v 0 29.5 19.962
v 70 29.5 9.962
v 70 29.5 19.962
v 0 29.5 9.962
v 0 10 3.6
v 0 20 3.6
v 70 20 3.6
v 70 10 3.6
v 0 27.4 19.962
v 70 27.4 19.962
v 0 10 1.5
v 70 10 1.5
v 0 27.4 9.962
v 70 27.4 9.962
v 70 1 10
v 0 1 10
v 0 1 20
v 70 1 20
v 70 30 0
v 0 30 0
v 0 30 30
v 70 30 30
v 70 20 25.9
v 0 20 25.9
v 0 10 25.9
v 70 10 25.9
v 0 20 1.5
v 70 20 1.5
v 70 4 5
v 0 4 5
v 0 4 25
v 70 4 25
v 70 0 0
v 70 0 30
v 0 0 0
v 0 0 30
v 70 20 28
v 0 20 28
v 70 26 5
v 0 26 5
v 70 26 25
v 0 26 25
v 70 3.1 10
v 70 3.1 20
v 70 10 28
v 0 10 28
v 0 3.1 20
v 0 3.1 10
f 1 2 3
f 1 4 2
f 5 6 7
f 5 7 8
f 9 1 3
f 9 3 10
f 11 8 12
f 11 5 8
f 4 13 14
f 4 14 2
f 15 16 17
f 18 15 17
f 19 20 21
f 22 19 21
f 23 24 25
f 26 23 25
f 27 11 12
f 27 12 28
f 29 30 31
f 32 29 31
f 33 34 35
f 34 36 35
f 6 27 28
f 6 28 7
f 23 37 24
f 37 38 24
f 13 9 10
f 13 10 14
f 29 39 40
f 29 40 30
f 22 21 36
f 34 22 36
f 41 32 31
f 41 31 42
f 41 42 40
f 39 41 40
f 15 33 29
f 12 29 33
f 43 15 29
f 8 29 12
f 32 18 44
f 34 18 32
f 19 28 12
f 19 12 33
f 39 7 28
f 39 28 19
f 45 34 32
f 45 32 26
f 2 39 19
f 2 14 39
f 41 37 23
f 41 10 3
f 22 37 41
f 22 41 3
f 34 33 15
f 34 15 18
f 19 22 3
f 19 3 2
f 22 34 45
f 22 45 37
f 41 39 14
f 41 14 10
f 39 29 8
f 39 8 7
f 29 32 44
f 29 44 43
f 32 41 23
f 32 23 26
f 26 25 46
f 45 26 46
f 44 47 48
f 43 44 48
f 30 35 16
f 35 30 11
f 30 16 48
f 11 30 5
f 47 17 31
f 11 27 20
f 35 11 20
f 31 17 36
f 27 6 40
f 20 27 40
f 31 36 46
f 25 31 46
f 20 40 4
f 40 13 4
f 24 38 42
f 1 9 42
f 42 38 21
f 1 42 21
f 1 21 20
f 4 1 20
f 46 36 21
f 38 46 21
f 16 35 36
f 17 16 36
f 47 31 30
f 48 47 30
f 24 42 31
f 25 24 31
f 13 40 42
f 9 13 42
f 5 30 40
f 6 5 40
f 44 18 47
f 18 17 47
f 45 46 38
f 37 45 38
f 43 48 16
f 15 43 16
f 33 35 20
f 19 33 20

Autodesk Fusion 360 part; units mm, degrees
sketch "Sketch1" plane through (0, 0, 0) normal (1, 0, 0) x (0, 1, 0)
  line L0 (0, 0) -> (30, 0)
  line L1 (30, 0) -> (30, 30)
  line L2 (30, 30) -> (0, 30)
  line L3 (0, 30) -> (0, 0)
  line L4 (1, 20) -> (3.1, 20)
  line L5 (3.1, 20) -> (3.1, 10)
  line L6 (3.1, 10) -> (1, 10)
  line L7 (1, 10) -> (1, 20)
  line L8 (10, 28) -> (20, 28)
  line L9 (20, 28) -> (20, 25.9)
  line L10 (20, 25.9) -> (10, 25.9)
  line L11 (10, 25.9) -> (10, 28)
  line L12 (29.5, 19.9621) -> (27.4, 19.9621)
  line L13 (27.4, 19.9621) -> (27.4, 9.9621)
  line L14 (27.4, 9.9621) -> (29.5, 9.9621)
  line L15 (29.5, 9.9621) -> (29.5, 19.9621)
  line L16 (10, 1.5) -> (20, 1.5)
  line L17 (20, 1.5) -> (20, 3.6)
  line L18 (20, 3.6) -> (10, 3.6)
  line L19 (10, 3.6) -> (10, 1.5)
  line L20 (4, 25) -> (26, 25)
  line L21 (26, 25) -> (26, 5)
  line L22 (26, 5) -> (4, 5)
  line L23 (4, 5) -> (4, 25)
  dimension "d1" = 30
  dimension "d2" = 30
  dimension "d3" = 2.1
  dimension "d4" = 10
  dimension "d5" = 10
  dimension "d6" = 2.1
  dimension "d7" = 2.1
  dimension "d8" = 10
  dimension "d9" = 0.5
  dimension "d10" = 10
  dimension "d11" = 2.1
  dimension "d12" = 1.5
extrude "Extrude1" add sketch "Sketch1" along normal blind 70
